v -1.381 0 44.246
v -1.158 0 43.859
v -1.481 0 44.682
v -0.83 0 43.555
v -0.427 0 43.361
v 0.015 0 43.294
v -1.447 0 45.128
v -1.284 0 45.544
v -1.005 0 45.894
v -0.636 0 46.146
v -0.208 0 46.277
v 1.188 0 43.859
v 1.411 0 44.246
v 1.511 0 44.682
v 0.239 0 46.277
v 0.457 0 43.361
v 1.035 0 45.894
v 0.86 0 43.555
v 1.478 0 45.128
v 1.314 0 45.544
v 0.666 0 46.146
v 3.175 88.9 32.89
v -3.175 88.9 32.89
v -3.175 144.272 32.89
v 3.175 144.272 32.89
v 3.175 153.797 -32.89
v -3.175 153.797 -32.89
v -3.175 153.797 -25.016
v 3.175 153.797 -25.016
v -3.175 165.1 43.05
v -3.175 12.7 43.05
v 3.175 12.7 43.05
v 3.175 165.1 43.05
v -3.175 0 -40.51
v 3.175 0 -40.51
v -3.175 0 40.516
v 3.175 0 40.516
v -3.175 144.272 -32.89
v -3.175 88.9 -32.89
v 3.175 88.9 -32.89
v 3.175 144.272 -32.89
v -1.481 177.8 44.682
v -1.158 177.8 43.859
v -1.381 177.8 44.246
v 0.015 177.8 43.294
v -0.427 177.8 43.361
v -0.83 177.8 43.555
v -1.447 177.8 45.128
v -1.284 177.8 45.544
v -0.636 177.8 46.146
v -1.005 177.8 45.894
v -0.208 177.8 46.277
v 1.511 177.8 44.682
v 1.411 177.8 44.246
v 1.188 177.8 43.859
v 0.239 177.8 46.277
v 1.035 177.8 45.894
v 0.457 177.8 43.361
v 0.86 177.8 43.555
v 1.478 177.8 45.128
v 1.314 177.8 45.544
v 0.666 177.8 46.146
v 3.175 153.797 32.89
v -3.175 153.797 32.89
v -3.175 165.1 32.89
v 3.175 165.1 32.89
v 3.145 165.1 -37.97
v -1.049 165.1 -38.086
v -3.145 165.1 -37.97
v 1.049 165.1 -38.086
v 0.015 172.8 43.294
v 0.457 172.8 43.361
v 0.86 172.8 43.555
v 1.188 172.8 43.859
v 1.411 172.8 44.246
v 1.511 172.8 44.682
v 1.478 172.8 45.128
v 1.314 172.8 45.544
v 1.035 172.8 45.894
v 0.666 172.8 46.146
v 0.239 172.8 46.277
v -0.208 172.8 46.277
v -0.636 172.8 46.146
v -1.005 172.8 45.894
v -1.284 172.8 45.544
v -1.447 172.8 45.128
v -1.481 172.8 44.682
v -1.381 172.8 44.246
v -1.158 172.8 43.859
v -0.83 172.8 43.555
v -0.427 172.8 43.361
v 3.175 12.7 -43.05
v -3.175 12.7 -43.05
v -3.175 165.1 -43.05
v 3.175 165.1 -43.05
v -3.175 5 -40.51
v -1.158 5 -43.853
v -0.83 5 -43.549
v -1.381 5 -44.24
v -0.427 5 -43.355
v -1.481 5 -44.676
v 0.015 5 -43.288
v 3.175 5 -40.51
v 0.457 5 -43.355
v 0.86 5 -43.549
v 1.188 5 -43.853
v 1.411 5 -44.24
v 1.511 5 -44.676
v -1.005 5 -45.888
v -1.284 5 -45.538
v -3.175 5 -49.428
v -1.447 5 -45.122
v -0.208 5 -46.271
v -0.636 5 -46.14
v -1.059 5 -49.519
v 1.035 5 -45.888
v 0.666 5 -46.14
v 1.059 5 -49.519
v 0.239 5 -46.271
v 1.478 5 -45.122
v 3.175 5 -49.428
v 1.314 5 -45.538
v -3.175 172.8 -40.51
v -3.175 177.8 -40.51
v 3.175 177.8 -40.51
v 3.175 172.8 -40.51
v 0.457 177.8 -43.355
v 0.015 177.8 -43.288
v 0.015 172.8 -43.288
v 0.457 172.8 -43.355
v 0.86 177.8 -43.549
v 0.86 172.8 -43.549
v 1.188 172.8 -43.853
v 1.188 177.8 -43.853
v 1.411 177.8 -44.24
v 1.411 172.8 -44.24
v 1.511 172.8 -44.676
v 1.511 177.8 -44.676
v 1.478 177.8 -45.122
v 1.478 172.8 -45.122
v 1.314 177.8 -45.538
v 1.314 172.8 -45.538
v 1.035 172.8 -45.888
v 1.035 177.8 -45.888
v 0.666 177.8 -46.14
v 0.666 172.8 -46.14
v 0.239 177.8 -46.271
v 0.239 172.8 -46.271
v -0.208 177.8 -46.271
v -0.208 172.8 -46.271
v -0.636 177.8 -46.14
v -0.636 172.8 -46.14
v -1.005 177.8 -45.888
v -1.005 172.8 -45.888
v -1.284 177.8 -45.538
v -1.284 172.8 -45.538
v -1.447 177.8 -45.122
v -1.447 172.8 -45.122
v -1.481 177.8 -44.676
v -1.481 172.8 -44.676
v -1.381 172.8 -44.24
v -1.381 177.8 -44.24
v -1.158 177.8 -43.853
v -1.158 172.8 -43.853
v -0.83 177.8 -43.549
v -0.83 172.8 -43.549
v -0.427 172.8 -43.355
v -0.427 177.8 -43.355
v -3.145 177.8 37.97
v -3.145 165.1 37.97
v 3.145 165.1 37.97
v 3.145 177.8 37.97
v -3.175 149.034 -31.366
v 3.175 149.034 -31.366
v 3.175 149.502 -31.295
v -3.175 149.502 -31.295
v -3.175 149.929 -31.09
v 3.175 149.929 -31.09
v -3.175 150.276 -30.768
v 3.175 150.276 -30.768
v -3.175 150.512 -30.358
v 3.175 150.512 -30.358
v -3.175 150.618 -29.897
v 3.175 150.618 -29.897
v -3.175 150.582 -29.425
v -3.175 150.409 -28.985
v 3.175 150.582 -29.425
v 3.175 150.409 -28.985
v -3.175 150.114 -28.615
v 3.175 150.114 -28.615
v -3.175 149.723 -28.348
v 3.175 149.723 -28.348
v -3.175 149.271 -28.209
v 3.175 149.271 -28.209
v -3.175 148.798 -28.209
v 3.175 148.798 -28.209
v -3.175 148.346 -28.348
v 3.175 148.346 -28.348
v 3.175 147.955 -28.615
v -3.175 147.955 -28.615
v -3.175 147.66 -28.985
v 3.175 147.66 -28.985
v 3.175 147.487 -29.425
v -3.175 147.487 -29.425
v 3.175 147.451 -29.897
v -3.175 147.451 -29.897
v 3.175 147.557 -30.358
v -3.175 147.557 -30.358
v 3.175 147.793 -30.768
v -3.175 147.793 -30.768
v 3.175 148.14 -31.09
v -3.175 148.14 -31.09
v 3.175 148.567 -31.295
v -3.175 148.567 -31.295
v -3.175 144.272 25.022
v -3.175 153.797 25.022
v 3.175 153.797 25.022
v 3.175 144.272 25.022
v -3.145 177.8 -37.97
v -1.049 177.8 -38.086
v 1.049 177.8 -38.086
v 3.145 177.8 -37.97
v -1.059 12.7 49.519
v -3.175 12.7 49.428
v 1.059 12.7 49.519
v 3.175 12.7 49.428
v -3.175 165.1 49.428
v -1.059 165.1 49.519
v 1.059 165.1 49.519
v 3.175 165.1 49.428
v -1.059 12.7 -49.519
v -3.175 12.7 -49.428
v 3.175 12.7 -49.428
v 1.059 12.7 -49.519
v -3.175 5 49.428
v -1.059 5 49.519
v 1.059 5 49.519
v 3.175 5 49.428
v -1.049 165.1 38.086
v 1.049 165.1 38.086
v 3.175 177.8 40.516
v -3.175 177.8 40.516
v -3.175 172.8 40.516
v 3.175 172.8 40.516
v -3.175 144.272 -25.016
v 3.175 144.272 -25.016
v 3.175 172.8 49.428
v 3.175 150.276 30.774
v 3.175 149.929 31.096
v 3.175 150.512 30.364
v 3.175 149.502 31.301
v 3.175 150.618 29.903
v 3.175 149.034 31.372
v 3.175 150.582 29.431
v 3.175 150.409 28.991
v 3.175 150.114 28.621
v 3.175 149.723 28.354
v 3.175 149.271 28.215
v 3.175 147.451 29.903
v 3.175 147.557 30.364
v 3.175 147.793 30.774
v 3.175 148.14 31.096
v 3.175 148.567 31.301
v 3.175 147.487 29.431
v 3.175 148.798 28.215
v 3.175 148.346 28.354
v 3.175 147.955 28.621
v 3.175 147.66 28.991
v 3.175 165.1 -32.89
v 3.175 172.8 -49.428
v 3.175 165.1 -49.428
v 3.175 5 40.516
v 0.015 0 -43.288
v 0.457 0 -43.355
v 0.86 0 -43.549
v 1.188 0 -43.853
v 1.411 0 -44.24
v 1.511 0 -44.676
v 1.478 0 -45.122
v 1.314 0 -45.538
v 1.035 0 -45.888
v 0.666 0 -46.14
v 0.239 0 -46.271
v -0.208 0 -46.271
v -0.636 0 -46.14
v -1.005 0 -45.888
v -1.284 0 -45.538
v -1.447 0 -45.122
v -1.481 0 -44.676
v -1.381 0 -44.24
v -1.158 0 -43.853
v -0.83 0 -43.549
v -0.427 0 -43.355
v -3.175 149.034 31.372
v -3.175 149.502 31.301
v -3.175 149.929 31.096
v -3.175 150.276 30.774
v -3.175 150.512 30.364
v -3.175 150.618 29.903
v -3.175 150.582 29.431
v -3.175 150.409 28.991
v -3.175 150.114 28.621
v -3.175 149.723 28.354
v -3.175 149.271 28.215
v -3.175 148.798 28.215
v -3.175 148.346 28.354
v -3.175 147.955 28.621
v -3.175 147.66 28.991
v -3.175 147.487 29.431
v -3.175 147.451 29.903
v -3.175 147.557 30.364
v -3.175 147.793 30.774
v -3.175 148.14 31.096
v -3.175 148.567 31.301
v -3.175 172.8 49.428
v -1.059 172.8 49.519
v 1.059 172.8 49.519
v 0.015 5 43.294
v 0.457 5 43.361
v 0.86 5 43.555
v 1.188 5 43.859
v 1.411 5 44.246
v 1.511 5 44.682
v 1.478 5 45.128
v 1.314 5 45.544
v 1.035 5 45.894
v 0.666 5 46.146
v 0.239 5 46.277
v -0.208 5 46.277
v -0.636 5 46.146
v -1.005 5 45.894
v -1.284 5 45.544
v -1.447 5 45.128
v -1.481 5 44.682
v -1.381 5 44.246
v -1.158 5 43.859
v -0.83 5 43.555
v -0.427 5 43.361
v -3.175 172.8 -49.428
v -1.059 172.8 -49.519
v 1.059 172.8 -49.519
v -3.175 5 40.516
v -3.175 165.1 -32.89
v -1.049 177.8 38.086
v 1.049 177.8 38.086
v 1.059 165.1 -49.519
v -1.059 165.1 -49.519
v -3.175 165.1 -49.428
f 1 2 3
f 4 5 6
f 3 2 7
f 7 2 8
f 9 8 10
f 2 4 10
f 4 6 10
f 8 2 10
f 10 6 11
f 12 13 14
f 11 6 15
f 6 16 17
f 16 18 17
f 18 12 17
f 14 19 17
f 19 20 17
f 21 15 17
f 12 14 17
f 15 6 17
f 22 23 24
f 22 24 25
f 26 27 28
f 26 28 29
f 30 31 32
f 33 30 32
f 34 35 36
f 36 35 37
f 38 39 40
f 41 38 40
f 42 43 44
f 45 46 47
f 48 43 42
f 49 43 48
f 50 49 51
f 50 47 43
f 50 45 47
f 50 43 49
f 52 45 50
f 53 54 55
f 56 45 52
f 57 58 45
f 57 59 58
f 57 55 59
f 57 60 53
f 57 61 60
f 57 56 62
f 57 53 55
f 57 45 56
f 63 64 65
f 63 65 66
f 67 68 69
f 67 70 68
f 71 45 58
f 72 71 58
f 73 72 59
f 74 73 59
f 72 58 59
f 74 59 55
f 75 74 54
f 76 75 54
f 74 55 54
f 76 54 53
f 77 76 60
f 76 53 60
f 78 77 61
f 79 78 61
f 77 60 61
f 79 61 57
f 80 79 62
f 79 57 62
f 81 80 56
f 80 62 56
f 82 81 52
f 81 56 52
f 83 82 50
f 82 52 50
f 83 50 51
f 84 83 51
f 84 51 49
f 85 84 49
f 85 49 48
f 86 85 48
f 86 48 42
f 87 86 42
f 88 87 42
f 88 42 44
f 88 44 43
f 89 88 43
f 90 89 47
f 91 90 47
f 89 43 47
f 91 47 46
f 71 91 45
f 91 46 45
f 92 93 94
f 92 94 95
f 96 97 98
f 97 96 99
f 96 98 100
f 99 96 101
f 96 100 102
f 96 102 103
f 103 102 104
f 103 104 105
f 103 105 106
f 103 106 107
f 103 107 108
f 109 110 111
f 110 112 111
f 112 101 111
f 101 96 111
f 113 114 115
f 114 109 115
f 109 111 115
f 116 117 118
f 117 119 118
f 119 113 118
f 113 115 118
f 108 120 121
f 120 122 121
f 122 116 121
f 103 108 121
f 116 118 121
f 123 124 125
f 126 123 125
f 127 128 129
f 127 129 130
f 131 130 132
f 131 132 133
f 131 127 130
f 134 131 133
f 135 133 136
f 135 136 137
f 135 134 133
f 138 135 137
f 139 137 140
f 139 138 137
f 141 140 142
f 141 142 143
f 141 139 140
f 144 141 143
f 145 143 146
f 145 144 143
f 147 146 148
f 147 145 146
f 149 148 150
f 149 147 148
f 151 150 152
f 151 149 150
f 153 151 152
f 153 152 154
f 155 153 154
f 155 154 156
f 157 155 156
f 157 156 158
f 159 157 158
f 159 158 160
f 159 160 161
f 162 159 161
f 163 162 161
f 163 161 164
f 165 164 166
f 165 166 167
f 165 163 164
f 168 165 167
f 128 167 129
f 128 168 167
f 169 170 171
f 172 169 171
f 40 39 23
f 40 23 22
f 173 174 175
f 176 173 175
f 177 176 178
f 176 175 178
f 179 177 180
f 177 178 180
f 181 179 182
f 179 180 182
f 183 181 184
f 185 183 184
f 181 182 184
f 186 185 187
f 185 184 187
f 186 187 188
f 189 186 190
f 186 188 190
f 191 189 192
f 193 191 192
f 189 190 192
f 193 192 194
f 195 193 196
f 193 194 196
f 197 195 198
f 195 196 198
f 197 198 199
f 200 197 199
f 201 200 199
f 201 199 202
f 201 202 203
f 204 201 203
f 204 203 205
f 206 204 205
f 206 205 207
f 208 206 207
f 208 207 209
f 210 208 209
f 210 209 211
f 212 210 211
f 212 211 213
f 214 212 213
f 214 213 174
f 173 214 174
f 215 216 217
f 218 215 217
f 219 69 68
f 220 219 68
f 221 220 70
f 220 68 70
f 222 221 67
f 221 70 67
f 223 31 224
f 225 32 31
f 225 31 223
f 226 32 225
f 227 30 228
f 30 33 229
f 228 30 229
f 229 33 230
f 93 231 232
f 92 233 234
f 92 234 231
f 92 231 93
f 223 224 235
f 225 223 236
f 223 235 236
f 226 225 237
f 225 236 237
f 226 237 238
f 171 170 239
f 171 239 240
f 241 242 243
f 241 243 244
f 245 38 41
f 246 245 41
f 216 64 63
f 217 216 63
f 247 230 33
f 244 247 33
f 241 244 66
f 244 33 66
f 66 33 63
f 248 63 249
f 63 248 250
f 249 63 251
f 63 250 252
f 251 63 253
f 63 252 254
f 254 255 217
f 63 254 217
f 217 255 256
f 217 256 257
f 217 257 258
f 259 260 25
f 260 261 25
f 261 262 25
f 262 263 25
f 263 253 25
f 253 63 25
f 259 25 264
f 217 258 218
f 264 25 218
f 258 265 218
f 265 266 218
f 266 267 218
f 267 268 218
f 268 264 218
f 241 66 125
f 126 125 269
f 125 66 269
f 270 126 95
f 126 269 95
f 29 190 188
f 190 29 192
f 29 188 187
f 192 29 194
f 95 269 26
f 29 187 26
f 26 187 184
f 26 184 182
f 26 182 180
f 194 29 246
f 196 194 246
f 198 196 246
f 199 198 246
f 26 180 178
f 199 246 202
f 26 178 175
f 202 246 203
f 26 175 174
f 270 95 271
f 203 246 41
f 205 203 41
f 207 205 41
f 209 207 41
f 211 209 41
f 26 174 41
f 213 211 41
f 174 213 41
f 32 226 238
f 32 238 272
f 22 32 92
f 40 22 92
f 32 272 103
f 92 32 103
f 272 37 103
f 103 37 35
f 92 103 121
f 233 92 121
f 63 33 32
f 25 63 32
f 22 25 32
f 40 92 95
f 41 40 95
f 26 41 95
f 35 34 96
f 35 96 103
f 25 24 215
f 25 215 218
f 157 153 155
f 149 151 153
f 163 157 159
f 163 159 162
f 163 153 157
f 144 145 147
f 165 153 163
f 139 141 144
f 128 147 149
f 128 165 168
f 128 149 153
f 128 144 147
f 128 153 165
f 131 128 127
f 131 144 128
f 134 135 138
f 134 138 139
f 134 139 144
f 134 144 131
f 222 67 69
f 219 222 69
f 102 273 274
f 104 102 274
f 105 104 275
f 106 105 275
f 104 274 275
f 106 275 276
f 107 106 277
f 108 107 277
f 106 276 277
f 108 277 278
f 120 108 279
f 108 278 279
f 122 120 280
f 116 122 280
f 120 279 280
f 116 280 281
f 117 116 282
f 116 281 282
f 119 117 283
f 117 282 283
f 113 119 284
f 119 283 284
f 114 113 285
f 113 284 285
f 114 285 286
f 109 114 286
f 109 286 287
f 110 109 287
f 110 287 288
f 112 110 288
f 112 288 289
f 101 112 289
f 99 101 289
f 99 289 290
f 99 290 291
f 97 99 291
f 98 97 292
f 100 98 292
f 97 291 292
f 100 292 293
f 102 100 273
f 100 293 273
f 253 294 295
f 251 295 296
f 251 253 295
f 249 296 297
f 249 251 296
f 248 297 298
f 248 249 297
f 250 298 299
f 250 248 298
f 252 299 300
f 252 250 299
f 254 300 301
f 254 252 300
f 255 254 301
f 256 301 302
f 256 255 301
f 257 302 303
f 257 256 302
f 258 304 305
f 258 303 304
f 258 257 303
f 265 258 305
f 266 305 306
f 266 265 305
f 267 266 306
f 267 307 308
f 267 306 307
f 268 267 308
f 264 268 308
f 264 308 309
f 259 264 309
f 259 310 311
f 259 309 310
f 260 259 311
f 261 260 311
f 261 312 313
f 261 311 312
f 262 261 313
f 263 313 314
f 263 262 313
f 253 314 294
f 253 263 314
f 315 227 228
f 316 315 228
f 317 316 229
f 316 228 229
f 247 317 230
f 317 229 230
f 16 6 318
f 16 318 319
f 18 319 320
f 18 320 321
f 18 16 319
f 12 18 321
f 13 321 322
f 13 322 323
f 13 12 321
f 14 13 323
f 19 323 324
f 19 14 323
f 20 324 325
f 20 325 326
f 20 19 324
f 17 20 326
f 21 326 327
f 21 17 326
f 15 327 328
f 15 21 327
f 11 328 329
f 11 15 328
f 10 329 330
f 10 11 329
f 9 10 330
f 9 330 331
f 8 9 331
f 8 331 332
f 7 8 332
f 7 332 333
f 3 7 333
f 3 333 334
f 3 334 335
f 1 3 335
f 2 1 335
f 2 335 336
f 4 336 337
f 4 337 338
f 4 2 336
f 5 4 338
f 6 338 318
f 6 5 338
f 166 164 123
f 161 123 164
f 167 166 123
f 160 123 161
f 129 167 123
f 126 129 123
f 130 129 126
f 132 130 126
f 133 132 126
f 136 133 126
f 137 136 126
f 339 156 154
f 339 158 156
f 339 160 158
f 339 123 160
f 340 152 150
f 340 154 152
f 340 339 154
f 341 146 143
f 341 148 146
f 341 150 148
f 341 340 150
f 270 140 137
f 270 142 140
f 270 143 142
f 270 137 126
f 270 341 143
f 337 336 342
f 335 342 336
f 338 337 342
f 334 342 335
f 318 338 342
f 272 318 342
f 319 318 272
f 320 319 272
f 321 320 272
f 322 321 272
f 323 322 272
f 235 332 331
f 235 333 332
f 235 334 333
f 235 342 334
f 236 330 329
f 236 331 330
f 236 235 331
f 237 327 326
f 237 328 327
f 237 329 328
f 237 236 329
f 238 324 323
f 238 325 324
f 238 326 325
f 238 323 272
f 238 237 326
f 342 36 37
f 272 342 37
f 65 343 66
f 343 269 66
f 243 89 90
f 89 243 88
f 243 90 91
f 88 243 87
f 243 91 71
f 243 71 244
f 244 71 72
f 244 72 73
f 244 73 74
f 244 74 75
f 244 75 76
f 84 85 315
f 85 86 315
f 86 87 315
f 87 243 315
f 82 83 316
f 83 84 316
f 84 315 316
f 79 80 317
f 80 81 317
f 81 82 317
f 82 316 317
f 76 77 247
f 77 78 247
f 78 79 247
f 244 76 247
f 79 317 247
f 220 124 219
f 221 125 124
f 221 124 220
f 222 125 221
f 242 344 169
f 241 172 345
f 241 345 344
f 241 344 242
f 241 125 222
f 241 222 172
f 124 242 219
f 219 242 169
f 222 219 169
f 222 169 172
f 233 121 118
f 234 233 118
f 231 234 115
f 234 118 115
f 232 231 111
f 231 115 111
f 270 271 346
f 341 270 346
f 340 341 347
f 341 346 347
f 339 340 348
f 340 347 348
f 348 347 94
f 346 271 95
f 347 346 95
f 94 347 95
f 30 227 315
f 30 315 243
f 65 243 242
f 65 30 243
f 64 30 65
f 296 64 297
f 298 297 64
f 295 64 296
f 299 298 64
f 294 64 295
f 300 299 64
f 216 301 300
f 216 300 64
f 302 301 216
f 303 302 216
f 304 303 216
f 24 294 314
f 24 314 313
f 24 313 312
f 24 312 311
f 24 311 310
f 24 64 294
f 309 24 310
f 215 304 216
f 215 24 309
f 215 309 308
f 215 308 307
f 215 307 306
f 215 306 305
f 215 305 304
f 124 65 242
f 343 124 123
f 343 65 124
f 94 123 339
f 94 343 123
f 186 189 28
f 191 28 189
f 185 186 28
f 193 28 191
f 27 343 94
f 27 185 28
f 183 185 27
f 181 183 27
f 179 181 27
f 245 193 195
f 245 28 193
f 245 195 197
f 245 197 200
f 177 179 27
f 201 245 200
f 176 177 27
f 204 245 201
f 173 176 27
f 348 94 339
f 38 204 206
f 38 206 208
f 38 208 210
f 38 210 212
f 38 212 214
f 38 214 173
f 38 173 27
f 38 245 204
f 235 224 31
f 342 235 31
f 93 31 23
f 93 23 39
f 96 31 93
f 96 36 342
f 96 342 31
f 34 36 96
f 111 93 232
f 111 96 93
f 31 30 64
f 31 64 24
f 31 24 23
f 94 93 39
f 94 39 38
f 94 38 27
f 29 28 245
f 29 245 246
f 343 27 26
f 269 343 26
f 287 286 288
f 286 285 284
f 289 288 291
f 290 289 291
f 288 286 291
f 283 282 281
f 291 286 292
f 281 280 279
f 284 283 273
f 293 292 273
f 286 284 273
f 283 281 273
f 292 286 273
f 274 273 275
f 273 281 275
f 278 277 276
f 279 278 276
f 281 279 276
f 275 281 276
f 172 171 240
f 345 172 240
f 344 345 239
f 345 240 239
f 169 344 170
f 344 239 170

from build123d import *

# Parameters (mm, degrees)
SKETCH1_R               = 49.53
SKETCH1_R_2             = 38.1
BOSS_EXTRUDE1_DEPTH     = 12.7
SKETCH4_W               = 6.35
SKETCH4_H               = 10.16
BOSS_EXTRUDE4_DEPTH     = 152.4
SKETCH6_R               = 49.53
BOSS_EXTRUDE8_DEPTH     = 12.7
CUT_EXTRUDE1_DEPTH      = 192.10018786
CUT_EXTRUDE1_DEPTH_BACK = 192.10018786
SKETCH8_W               = 6.35
SKETCH8_H               = 9.525
BOSS_EXTRUDE9_DEPTH     = 7.874
SKETCH9_R               = 1.5875
CUT_EXTRUDE2_DEPTH      = 192.831674819
SKETCH10_W              = 182.98458546
SKETCH10_H              = 212.101714012
CUT_EXTRUDE3_DEPTH      = 192.831674819
SKETCH13_W              = 128.016671202
SKETCH13_H              = 210.018995068
CUT_EXTRUDE4_DEPTH      = 191.199216379
SKETCH14_W              = 6.35
SKETCH14_H              = 8.918129625
SKETCH14_R              = 1.5
CUT_EXTRUDE5_DEPTH      = 5
SKETCH15_W              = 8.919843596
SKETCH15_H              = 5.203541281
CUT_EXTRUDE6_DEPTH      = 5
MIRROR4_COPY_1_SKETCH_W = 6.35
MIRROR4_COPY_1_SKETCH_H = 8.918129625
MIRROR4_COPY_1_SKETCH_R = 1.5
MIRROR4_COPY_1_DEPTH    = 5
MIRROR4_COPY_2_SKETCH_W = 8.919843596
MIRROR4_COPY_2_SKETCH_H = 5.203541281
MIRROR4_COPY_2_DEPTH    = 5
SKETCH16_W              = 6.35
SKETCH16_H              = 65.7800056
BOSS_EXTRUDE10_DEPTH    = 76.2


with BuildPart() as part:
    # Sketch1 → Boss-Extrude1 (new body)
    # profile 1 of 2: a face of its own
    with BuildSketch(Plane(origin=(0, 0, 0), x_dir=(1, 0, 0), z_dir=(0, 1, 0))):
        with Locations(Location((0, 0, 0), (0, 0, 270))):
            Circle(SKETCH1_R)
        Circle(SKETCH1_R_2, mode=Mode.SUBTRACT)
    # profile 2 of 2: a face of its own
    with BuildSketch(Plane(origin=(0, 0, 0), x_dir=(1, 0, 0), z_dir=(0, 1, 0))):
        with BuildLine():
            Line((-3.175, 37.967477859), (-3.175, -37.967477859))
            ThreePointArc((-3.175, -37.967477859), (0, -38.1), (3.175, -37.967477859))
            Line((3.175, -37.967477859), (3.175, 37.967477859))
            ThreePointArc((3.175, 37.967477859), (0, 38.1), (-3.175, 37.967477859))
        make_face()
    extrude(amount=BOSS_EXTRUDE1_DEPTH)

    # Sketch4 → Boss-Extrude4 (add)
    with BuildSketch(Plane(origin=(0, 12.7, 0), x_dir=(1, 0, 0), z_dir=(0, 1, 0))):
        with Locations((0, -37.9700028)):
            Rectangle(SKETCH4_W, SKETCH4_H)
        with Locations((0, 37.9700028)):
            Rectangle(SKETCH4_W, SKETCH4_H)
    extrude(amount=BOSS_EXTRUDE4_DEPTH)

    # Sketch6 → Boss-Extrude8 (add)
    with BuildSketch(Plane(origin=(0, 165.1, 0), x_dir=(1, 0, 0), z_dir=(0, 1, 0))):
        with Locations(Location((0, 0, 0), (0, 0, 270))):
            Circle(SKETCH6_R)
        with BuildLine():
            Line((-3.144660136, -37.9700028), (3.144660136, -37.9700028))
            ThreePointArc((3.144660136, -37.9700028), (0, -38.1), (-3.144660136, -37.9700028))
        make_face(mode=Mode.SUBTRACT)
        with BuildLine():
            Line((3.175, -37.967477859), (3.175, 37.967477859))
            ThreePointArc((3.175, 37.967477859), (38.1, 0), (3.175, -37.967477859))
        make_face(mode=Mode.SUBTRACT)
        with BuildLine():
            Line((3.144660136, 37.9700028), (-3.144660136, 37.9700028))
            ThreePointArc((-3.144660136, 37.9700028), (0, 38.1), (3.144660136, 37.9700028))
        make_face(mode=Mode.SUBTRACT)
        with BuildLine():
            Line((-3.175, 37.967477859), (-3.175, -37.967477859))
            ThreePointArc((-3.175, -37.967477859), (-38.1, 0), (-3.175, 37.967477859))
        make_face(mode=Mode.SUBTRACT)
    extrude(amount=BOSS_EXTRUDE8_DEPTH)

    # Sketch7 → Cut-Extrude1 (cut, two sides: drawn at the far end of the back side and taken through both)
    with BuildSketch(Plane.XZ.offset(-CUT_EXTRUDE1_DEPTH_BACK)):
        with BuildLine():
            Line((-49.106263984, -6.464962301), (-40.292319166, -5.304584452))
            ThreePointArc((-40.292319166, -5.304584452), (-40.64, 0), (-40.292319166, 5.304584452))
            Line((-40.292319166, 5.304584452), (-49.106263984, 6.464962301))
            ThreePointArc((-49.106263984, 6.464962301), (-49.53, 0), (-49.106263984, -6.464962301))
        make_face()
        with BuildLine():
            Line((40.292319166, -5.304584452), (49.106263984, -6.464962301))
            ThreePointArc((49.106263984, -6.464962301), (49.423952468, -3.239416991), (49.53, 0))
            ThreePointArc((49.53, 0), (49.423952468, 3.239416991), (49.106263984, 6.464962301))
            Line((49.106263984, 6.464962301), (40.292319166, 5.304584452))
            ThreePointArc((40.292319166, 5.304584452), (40.64, 0), (40.292319166, -5.304584452))
        make_face()
        with BuildLine():
            Line((37.774049218, -4.973047924), (40.292319166, -5.304584452))
            ThreePointArc((40.292319166, -5.304584452), (40.64, 0), (40.292319166, 5.304584452))
            Line((40.292319166, 5.304584452), (37.774049218, 4.973047924))
            ThreePointArc((37.774049218, 4.973047924), (38.1, 0), (37.774049218, -4.973047924))
        make_face()
        with BuildLine():
            Line((-40.292319166, -5.304584452), (-37.774049218, -4.973047924))
            ThreePointArc((-37.774049218, -4.973047924), (-38.1, 0), (-37.774049218, 4.973047924))
            Line((-37.774049218, 4.973047924), (-40.292319166, 5.304584452))
            ThreePointArc((-40.292319166, 5.304584452), (-40.64, 0), (-40.292319166, -5.304584452))
        make_face()
    extrude(amount=CUT_EXTRUDE1_DEPTH + CUT_EXTRUDE1_DEPTH_BACK, mode=Mode.SUBTRACT)

    # Sketch8 → Boss-Extrude9 (add)
    with BuildSketch(Plane.XY.offset(-32.8900028)):
        with Locations((0, 28.7655)):
            Rectangle(SKETCH8_W, SKETCH8_H)
        with Locations((0, 149.0345)):
            Rectangle(SKETCH8_W, SKETCH8_H)
    boss_extrude9 = extrude(amount=BOSS_EXTRUDE9_DEPTH)

    # Mirror1: Boss-Extrude9 across plane
    add(boss_extrude9.mirror(Plane.XY.offset(0.0029972)))

    # Sketch9 → Cut-Extrude2 (cut, through all)
    with BuildSketch(Plane(origin=(3.175, 0, 0), x_dir=(0, 0, -1), z_dir=(1, 0, 0))):
        with Locations((29.7785028, 28.7655)):
            Circle(SKETCH9_R)
        with Locations((29.7785028, 149.0345)):
            Circle(SKETCH9_R)
    cut_extrude2 = extrude(amount=-CUT_EXTRUDE2_DEPTH, mode=Mode.SUBTRACT)

    # Mirror2: Cut-Extrude2 across plane
    add(cut_extrude2.mirror(Plane.XY.offset(0.0029972)), mode=Mode.SUBTRACT)

    # Sketch10 → Cut-Extrude3 (cut, through all)
    with BuildSketch(Plane.ZY.offset(3.175)):
        with Locations((0.893156514, 95.768616586)):
            Rectangle(SKETCH10_W, SKETCH10_H)
    extrude(amount=CUT_EXTRUDE3_DEPTH, mode=Mode.SUBTRACT)

    # Sketch13 → Cut-Extrude4 (cut, through all)
    with BuildSketch(Plane(origin=(3.175, 0, 0), x_dir=(0, 0, -1), z_dir=(1, 0, 0))):
        with Locations((3.230681638, 97.01833452)):
            Rectangle(SKETCH13_W, SKETCH13_H)
    extrude(amount=CUT_EXTRUDE4_DEPTH, mode=Mode.SUBTRACT)

    # Sketch14 → Cut-Extrude5 (cut)
    with BuildSketch(Plane(origin=(0, 177.8, 0), x_dir=(1, 0, 0), z_dir=(0, 1, 0))):
        with Locations((0, 44.969067612)):
            Rectangle(SKETCH14_W, SKETCH14_H)
        with Locations(Location((0.015169932, 44.788132425, 0), (0, 0, 270))):
            Circle(SKETCH14_R, mode=Mode.SUBTRACT)
    cut_extrude5 = extrude(amount=-CUT_EXTRUDE5_DEPTH, mode=Mode.SUBTRACT)

    # Sketch15 → Cut-Extrude6 (cut)
    with BuildSketch(Plane(origin=(0, 172.8, 0), x_dir=(1, 0, 0), z_dir=(0, 1, 0))):
        with Locations((0.161262395, 49.49484543)):
            Rectangle(SKETCH15_W, SKETCH15_H)
    cut_extrude6 = extrude(amount=CUT_EXTRUDE6_DEPTH, mode=Mode.SUBTRACT)

    # Mirror3: Cut-Extrude5, Cut-Extrude6 across plane
    add(cut_extrude5.mirror(Plane.XY.offset(0.0029972)), mode=Mode.SUBTRACT)
    add(cut_extrude6.mirror(Plane.XY.offset(0.0029972)), mode=Mode.SUBTRACT)

    # Mirror4: Cut-Extrude5, Cut-Extrude6 across plane
    add(cut_extrude5.mirror(Plane(origin=(0, 88.9, 0), x_dir=(0, 0, 1), z_dir=(0, -1, 0))), mode=Mode.SUBTRACT)
    add(cut_extrude6.mirror(Plane(origin=(0, 88.9, 0), x_dir=(0, 0, 1), z_dir=(0, -1, 0))), mode=Mode.SUBTRACT)

    # Mirror4 copy 1 sketch → Mirror4 copy 1 (cut)
    with BuildSketch(Plane(origin=(0, 0, 0.0059944), x_dir=(1, 0, 0), z_dir=(0, -1, 0))):
        with Locations((0, 44.969067612)):
            Rectangle(MIRROR4_COPY_1_SKETCH_W, MIRROR4_COPY_1_SKETCH_H)
        with Locations(Location((0.015169932, 44.788132425, 0), (0, 0, 270))):
            Circle(MIRROR4_COPY_1_SKETCH_R, mode=Mode.SUBTRACT)
    extrude(amount=-MIRROR4_COPY_1_DEPTH, mode=Mode.SUBTRACT)

    # Mirror4 copy 2 sketch → Mirror4 copy 2 (cut)
    with BuildSketch(Plane(origin=(0, 5, 0.0059944), x_dir=(1, 0, 0), z_dir=(0, -1, 0))):
        with Locations((0.161262395, 49.49484543)):
            Rectangle(MIRROR4_COPY_2_SKETCH_W, MIRROR4_COPY_2_SKETCH_H)
    extrude(amount=MIRROR4_COPY_2_DEPTH, mode=Mode.SUBTRACT)

    # Sketch16 → Boss-Extrude10 (add)
    with BuildSketch(Plane(origin=(0, 12.7, 0), x_dir=(1, 0, 0), z_dir=(0, 1, 0))):
        Rectangle(SKETCH16_W, SKETCH16_H)
    extrude(amount=BOSS_EXTRUDE10_DEPTH)


solid = part.part
